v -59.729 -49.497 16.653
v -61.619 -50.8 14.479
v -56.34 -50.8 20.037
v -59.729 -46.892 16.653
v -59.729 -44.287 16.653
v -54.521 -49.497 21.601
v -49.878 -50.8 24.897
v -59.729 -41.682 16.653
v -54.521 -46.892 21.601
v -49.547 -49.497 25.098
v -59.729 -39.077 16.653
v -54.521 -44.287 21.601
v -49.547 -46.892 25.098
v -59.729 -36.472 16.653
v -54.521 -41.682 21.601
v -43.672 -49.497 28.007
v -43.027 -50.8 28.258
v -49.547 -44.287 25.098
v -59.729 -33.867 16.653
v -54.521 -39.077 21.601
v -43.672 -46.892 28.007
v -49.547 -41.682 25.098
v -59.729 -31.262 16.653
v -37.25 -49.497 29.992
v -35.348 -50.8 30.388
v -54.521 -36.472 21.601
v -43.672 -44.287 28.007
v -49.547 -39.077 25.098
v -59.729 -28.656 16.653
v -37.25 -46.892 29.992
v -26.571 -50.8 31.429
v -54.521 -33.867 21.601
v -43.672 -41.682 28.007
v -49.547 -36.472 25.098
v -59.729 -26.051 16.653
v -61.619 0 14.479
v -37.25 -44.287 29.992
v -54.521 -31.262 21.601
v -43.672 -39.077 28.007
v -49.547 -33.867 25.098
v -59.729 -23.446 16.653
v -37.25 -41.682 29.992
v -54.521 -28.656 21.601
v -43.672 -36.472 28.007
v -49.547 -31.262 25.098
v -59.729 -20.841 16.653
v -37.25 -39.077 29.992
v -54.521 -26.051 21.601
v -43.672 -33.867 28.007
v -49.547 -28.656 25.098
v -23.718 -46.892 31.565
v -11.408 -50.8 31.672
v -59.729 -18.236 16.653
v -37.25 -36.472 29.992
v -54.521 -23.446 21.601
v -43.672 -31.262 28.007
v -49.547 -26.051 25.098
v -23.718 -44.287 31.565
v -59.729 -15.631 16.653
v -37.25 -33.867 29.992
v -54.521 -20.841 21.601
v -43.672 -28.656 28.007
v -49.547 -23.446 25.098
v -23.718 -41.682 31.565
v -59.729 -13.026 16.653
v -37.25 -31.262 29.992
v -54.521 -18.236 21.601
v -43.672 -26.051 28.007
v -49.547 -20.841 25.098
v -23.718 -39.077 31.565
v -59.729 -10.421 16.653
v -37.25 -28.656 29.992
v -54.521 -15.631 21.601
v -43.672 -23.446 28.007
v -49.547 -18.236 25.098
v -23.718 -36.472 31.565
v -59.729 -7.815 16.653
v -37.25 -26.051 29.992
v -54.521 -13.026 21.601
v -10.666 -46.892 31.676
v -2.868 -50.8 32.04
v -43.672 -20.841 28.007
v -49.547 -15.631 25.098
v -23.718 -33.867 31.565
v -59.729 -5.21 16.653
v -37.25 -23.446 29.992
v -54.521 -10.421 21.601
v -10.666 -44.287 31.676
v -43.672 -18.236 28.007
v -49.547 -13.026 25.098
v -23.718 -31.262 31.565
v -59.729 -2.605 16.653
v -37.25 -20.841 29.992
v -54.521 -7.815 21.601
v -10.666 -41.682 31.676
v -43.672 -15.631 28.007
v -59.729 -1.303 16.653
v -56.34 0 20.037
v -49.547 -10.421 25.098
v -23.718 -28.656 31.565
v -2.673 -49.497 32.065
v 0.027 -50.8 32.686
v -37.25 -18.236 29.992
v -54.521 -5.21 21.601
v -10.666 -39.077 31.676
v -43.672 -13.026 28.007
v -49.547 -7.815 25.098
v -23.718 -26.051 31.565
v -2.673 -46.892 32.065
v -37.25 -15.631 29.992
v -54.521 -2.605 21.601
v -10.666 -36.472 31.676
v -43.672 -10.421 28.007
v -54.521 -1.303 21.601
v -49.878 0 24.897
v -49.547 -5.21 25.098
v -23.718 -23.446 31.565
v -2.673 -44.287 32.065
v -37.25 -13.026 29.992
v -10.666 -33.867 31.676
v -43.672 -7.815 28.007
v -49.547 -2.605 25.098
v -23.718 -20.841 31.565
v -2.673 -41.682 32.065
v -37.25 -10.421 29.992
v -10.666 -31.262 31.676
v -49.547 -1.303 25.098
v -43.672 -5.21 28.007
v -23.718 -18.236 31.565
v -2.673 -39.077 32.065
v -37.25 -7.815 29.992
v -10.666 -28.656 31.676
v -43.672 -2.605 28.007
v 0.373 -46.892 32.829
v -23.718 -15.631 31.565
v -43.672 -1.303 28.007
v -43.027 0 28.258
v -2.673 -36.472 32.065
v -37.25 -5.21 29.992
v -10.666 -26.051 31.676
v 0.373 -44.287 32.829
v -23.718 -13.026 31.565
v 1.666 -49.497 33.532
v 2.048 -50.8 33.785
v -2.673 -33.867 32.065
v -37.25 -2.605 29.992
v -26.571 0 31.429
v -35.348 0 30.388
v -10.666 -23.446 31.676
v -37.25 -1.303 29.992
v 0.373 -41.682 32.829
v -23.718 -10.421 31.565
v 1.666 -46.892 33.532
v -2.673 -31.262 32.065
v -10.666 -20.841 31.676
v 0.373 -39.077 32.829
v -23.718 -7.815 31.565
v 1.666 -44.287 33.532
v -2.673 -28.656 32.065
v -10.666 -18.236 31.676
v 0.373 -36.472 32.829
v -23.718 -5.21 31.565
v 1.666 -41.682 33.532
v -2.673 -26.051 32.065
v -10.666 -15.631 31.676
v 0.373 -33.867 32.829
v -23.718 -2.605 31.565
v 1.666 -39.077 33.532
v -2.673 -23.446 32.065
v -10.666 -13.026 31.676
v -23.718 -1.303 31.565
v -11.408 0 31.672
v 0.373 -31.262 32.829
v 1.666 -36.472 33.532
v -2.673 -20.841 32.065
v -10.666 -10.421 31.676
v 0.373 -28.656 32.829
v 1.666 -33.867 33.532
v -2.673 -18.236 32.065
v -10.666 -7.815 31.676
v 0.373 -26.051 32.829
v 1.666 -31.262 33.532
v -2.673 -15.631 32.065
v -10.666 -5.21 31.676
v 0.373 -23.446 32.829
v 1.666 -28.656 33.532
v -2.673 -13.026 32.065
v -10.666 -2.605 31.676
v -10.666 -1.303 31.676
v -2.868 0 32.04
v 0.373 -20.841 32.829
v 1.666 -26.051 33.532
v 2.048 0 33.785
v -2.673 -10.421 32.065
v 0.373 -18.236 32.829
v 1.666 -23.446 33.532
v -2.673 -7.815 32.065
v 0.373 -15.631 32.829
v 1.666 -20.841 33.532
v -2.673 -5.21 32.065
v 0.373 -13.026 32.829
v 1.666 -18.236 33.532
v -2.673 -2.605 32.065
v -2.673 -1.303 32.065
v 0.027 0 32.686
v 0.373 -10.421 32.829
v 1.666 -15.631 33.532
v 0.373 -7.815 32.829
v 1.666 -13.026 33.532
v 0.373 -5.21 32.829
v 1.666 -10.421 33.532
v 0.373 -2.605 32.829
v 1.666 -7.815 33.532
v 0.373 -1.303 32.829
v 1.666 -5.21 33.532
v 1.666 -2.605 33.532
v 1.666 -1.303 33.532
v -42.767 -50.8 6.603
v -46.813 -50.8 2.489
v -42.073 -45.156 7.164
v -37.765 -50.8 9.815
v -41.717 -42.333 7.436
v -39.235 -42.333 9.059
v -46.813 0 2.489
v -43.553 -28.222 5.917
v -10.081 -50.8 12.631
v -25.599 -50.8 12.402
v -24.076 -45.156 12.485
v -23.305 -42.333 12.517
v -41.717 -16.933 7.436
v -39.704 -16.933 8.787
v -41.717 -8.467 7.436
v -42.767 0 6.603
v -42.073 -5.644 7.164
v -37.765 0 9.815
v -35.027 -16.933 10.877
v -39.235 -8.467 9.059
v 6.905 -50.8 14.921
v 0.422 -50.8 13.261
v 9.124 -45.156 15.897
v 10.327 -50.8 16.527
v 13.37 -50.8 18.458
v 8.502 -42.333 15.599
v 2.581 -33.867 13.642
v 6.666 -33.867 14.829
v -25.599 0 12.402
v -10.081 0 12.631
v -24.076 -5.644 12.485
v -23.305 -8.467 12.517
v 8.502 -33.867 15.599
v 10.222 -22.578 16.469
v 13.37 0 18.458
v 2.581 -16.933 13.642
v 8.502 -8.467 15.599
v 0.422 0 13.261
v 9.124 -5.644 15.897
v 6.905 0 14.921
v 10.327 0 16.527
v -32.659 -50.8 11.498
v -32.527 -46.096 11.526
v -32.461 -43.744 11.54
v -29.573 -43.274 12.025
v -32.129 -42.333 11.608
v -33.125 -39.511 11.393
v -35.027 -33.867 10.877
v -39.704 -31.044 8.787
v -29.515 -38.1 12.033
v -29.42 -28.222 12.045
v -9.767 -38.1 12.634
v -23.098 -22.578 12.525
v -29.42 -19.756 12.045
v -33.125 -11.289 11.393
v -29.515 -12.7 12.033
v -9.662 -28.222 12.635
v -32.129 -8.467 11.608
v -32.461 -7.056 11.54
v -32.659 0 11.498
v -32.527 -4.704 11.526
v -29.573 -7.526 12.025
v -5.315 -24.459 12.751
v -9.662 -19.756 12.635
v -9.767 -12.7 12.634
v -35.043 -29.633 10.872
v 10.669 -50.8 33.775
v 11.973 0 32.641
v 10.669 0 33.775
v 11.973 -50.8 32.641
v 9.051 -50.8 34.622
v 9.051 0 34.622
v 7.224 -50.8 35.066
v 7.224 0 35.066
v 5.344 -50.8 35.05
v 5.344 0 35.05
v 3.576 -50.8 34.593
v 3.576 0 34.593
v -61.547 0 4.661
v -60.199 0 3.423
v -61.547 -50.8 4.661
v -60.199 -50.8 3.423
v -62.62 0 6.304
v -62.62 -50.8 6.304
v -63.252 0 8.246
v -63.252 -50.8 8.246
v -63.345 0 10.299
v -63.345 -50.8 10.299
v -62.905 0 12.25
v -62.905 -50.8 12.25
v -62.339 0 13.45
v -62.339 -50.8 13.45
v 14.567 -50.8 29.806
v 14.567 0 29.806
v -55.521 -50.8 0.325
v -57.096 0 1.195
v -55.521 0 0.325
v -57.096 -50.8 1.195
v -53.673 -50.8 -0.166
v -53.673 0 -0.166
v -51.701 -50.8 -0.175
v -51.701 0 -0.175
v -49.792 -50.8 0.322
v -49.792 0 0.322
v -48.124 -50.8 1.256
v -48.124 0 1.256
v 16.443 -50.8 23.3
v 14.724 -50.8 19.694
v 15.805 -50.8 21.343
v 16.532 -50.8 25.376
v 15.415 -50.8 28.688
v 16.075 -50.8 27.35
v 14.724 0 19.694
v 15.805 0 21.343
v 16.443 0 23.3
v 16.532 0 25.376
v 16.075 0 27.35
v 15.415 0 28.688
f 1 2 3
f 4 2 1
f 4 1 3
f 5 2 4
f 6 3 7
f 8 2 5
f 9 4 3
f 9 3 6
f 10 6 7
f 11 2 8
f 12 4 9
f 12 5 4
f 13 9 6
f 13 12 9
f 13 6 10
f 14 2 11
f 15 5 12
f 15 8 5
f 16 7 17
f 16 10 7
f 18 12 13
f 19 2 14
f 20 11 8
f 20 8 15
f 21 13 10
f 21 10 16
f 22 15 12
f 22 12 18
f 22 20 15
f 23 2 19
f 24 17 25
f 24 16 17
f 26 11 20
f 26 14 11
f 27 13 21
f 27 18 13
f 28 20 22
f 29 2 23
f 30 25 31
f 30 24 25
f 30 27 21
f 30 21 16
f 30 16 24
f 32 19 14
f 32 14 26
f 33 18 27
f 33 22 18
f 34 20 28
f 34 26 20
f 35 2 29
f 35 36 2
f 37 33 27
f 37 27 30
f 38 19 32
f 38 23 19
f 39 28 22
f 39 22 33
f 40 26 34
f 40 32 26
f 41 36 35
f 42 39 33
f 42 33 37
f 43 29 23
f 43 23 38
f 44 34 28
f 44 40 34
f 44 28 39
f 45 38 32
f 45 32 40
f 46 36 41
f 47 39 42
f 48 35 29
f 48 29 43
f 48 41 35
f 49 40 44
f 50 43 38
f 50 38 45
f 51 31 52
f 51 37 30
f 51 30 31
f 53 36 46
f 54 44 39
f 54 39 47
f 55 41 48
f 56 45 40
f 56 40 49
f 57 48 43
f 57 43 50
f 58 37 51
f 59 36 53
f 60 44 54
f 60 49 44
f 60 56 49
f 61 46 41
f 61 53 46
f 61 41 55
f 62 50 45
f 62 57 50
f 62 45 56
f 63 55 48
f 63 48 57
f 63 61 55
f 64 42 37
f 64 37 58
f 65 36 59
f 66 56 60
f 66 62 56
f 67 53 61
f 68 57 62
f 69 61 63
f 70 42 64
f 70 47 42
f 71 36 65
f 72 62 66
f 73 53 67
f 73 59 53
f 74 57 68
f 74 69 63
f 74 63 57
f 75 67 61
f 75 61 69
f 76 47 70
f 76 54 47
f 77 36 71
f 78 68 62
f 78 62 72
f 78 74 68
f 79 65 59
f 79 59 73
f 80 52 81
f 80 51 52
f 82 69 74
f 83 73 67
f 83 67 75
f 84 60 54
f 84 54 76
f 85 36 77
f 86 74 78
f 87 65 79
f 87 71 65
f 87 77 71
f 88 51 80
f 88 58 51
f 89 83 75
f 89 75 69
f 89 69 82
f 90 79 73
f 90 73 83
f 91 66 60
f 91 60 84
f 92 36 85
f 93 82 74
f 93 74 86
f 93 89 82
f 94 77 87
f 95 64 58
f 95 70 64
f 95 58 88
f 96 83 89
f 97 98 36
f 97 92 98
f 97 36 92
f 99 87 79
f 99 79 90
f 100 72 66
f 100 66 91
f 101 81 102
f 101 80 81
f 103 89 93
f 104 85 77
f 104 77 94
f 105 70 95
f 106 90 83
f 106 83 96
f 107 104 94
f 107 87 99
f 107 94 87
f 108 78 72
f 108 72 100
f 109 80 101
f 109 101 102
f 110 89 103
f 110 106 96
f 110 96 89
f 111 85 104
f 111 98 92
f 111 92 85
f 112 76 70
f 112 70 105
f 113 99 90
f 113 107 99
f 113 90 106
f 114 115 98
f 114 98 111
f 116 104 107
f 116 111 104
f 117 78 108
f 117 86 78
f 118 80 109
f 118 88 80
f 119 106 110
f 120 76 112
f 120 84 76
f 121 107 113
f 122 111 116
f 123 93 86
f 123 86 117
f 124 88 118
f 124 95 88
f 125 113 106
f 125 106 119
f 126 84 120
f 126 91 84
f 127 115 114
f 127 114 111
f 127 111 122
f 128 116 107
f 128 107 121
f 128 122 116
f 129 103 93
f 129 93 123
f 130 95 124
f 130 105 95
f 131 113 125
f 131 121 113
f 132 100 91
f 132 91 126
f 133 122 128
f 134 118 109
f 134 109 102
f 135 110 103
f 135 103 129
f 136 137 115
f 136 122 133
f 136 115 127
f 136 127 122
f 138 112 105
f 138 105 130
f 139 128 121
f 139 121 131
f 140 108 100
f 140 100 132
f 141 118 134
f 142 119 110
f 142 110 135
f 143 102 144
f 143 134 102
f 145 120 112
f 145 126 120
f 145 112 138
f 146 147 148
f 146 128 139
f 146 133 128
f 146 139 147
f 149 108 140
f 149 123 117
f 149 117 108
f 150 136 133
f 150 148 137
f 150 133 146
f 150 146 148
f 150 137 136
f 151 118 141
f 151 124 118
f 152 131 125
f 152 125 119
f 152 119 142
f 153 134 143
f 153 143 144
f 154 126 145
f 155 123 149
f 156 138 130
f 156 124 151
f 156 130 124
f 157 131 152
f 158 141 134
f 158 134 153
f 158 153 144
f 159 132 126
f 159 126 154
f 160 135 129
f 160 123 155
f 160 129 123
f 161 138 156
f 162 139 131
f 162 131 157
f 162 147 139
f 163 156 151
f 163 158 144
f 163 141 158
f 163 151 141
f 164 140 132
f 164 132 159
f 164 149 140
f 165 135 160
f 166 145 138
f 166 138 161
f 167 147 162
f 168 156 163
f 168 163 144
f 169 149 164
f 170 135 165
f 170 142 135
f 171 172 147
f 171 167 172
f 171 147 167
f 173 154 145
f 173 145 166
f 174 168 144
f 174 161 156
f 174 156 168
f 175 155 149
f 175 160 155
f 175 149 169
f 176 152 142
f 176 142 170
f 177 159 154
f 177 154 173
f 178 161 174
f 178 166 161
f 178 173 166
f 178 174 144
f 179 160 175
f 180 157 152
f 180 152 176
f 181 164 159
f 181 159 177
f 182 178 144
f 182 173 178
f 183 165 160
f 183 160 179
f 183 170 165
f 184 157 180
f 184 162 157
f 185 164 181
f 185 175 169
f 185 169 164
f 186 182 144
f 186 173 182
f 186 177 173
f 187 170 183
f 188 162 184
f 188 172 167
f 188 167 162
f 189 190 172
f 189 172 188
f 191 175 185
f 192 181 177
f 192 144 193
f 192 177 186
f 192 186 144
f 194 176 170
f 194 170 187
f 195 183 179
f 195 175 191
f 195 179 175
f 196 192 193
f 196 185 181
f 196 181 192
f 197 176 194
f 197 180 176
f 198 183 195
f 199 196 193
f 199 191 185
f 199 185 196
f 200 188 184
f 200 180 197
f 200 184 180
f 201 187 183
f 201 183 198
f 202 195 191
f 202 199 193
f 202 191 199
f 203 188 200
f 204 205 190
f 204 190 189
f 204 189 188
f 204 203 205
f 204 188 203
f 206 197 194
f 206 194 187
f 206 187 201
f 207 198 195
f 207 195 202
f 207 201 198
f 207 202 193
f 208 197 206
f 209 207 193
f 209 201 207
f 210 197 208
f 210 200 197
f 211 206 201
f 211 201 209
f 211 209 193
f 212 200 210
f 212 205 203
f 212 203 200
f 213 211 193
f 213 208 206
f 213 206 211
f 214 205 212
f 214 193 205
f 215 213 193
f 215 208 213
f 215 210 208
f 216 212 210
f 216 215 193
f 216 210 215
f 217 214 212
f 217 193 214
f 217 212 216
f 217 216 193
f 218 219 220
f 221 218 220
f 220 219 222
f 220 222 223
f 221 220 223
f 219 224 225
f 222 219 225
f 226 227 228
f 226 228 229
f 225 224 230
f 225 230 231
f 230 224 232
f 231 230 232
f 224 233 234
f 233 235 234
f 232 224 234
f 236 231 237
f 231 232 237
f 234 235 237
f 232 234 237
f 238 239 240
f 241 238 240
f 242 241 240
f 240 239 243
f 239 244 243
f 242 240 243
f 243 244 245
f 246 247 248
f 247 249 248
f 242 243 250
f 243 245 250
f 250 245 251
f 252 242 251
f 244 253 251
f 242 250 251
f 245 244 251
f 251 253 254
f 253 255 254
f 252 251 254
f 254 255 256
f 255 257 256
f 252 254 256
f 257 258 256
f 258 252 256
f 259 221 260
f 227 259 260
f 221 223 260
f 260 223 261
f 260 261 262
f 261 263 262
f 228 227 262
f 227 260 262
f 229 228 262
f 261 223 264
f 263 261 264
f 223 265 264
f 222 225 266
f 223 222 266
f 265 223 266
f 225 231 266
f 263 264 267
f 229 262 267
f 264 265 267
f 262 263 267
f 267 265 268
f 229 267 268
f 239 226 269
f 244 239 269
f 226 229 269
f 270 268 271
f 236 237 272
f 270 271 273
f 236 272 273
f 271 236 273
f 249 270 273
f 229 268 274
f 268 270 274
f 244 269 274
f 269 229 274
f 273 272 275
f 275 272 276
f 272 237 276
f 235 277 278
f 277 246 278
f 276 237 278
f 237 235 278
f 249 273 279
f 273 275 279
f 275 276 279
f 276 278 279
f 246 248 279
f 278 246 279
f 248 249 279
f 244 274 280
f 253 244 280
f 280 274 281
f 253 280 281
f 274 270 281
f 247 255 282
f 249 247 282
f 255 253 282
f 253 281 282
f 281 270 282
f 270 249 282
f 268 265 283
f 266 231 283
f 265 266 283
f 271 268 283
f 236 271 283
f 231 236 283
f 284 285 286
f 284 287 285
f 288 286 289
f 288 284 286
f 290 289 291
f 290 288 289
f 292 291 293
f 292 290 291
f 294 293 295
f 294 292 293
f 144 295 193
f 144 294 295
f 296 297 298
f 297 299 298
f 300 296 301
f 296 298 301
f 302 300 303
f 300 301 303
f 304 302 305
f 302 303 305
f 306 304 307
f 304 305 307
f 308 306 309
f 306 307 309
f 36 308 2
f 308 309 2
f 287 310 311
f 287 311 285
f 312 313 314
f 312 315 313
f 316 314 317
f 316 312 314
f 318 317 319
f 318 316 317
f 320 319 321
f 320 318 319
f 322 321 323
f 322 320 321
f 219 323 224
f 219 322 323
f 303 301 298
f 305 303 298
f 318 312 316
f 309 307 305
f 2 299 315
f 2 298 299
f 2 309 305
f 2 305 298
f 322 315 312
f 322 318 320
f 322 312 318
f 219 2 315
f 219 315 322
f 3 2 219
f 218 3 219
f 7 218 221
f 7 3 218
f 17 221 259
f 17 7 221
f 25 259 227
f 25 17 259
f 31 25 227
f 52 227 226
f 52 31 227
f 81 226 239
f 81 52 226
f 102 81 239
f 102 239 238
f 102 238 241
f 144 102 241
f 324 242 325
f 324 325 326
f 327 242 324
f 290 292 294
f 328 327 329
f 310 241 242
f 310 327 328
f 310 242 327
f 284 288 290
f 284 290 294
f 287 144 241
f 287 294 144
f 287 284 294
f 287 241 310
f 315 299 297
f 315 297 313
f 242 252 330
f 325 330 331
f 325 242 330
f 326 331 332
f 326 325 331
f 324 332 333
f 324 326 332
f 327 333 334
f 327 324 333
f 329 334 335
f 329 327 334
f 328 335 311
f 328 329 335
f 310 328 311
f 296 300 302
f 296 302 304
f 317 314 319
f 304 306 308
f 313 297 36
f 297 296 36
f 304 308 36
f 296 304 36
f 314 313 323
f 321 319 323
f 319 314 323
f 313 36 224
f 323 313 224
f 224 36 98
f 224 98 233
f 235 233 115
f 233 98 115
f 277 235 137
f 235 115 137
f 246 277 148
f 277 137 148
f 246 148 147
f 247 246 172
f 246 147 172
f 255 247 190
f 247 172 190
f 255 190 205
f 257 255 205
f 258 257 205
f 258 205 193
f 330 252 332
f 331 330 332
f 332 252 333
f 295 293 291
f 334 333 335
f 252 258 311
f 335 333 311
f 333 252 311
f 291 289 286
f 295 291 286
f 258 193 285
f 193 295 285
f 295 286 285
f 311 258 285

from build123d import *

# Parameters (mm, degrees)
F1_DEPTH = 50.8
F2_R     = 7.62


# Not quite as in the source:
# - the dataset's text gives a spline's control points without its knots; the knots are read off the source's solid


with BuildPart() as f1:
    # F0 (on Front) → F1 (new body)
    with BuildSketch(Plane.XZ):
        with BuildLine():
            Line((-66.5414150367, 7.9755592532), (-51.0662905872, -3.1340322457))
            add(Edge.make_bspline(
                [(-51.0662905872, -3.1340322457), (-46.9080086103, 2.6582537348), (-37.2164193187, 16.158169588), (3.9661427847, 9.376928998), (15.1752961857, 19.6334986968), (19.9103225023, 23.9661298692)],
                knots=[0, 0, 0, 0, 0.302673171, 0.7054317335, 1, 1, 1, 1], degree=3))
            Line((19.9103225023, 23.9661298692), (7.0503695481, 38.0204569615))
            add(Edge.make_bspline(
                [(-66.5414150367, 7.9755592532), (-65.6827574204, 9.1716278461), (-64.2376881581, 11.1925403484), (-61.8537311601, 14.230245381), (-59.7849919212, 16.6397090343), (-57.3812599932, 19.1267056888), (-54.5913152498, 21.616929755), (-51.9156052216, 23.6141415002), (-49.5636524979, 25.1087524342), (-47.6977784369, 26.1638231657), (-45.7360020225, 27.1394154139), (-43.6849425957, 28.0238468654), (-41.9133563994, 28.6753866943), (-40.4544972877, 29.1442267499), (-39.3706343495, 29.4604482596), (-38.3024046597, 29.7433243724), (-36.8966327798, 30.0805873366), (-34.4850412565, 30.5755105454), (-31.1673262141, 31.0605685349), (-27.3563371493, 31.4025851529), (-23.6940833425, 31.582346389), (-20.1745271825, 31.65755623), (-15.6846174083, 31.6781564731), (-11.5360581226, 31.6568797923), (-7.8877151981, 31.7097261242), (-5.4640436851, 31.8039348118), (-3.7669566424, 31.9346358754), (-2.6503542293, 32.0634185934), (-2.0645638727, 32.1496749584), (-1.6701914585, 32.2182935913), (-1.4140790271, 32.2680724783), (-1.1968720881, 32.3150339788), (-0.9185781733, 32.3814206056), (-0.6019359075, 32.4682882445), (-0.1412938907, 32.6163591904), (0.3743523739, 32.8201499972), (0.9825969287, 33.1187793404), (1.6485537837, 33.510239909), (2.6765705542, 34.2100049696), (4.3015951848, 35.5125797753), (6.0457156922, 37.1011812653), (7.0503695481, 38.0204569615)],
                knots=[0, 0, 0, 0, 0.0625, 0.09375, 0.125, 0.15625, 0.1875, 0.21875, 0.234375, 0.25, 0.265625, 0.28125, 0.296875, 0.3046875, 0.3125, 0.3203125, 0.328125, 0.34375, 0.375, 0.40625, 0.4375, 0.46875, 0.5, 0.5625, 0.59375, 0.625, 0.65625, 0.671875, 0.6875, 0.6953125, 0.703125, 0.7109375, 0.71875, 0.734375, 0.75, 0.78125, 0.8125, 0.84375, 0.875, 0.9375, 1, 1, 1, 1], degree=3))
        make_face()
    extrude(amount=F1_DEPTH)

    # F2
    f2_edges = [f1.edges().sort_by_distance(p)[0] for p in [
        (7.05037, -25.4, 38.020457),
        (19.910323, -25.4, 23.96613),
        (-66.541415, -25.4, 7.975559),
        (-51.066291, -25.4, -3.134032),
    ]]
    fillet(f2_edges, radius=F2_R)


solid = f1.part
